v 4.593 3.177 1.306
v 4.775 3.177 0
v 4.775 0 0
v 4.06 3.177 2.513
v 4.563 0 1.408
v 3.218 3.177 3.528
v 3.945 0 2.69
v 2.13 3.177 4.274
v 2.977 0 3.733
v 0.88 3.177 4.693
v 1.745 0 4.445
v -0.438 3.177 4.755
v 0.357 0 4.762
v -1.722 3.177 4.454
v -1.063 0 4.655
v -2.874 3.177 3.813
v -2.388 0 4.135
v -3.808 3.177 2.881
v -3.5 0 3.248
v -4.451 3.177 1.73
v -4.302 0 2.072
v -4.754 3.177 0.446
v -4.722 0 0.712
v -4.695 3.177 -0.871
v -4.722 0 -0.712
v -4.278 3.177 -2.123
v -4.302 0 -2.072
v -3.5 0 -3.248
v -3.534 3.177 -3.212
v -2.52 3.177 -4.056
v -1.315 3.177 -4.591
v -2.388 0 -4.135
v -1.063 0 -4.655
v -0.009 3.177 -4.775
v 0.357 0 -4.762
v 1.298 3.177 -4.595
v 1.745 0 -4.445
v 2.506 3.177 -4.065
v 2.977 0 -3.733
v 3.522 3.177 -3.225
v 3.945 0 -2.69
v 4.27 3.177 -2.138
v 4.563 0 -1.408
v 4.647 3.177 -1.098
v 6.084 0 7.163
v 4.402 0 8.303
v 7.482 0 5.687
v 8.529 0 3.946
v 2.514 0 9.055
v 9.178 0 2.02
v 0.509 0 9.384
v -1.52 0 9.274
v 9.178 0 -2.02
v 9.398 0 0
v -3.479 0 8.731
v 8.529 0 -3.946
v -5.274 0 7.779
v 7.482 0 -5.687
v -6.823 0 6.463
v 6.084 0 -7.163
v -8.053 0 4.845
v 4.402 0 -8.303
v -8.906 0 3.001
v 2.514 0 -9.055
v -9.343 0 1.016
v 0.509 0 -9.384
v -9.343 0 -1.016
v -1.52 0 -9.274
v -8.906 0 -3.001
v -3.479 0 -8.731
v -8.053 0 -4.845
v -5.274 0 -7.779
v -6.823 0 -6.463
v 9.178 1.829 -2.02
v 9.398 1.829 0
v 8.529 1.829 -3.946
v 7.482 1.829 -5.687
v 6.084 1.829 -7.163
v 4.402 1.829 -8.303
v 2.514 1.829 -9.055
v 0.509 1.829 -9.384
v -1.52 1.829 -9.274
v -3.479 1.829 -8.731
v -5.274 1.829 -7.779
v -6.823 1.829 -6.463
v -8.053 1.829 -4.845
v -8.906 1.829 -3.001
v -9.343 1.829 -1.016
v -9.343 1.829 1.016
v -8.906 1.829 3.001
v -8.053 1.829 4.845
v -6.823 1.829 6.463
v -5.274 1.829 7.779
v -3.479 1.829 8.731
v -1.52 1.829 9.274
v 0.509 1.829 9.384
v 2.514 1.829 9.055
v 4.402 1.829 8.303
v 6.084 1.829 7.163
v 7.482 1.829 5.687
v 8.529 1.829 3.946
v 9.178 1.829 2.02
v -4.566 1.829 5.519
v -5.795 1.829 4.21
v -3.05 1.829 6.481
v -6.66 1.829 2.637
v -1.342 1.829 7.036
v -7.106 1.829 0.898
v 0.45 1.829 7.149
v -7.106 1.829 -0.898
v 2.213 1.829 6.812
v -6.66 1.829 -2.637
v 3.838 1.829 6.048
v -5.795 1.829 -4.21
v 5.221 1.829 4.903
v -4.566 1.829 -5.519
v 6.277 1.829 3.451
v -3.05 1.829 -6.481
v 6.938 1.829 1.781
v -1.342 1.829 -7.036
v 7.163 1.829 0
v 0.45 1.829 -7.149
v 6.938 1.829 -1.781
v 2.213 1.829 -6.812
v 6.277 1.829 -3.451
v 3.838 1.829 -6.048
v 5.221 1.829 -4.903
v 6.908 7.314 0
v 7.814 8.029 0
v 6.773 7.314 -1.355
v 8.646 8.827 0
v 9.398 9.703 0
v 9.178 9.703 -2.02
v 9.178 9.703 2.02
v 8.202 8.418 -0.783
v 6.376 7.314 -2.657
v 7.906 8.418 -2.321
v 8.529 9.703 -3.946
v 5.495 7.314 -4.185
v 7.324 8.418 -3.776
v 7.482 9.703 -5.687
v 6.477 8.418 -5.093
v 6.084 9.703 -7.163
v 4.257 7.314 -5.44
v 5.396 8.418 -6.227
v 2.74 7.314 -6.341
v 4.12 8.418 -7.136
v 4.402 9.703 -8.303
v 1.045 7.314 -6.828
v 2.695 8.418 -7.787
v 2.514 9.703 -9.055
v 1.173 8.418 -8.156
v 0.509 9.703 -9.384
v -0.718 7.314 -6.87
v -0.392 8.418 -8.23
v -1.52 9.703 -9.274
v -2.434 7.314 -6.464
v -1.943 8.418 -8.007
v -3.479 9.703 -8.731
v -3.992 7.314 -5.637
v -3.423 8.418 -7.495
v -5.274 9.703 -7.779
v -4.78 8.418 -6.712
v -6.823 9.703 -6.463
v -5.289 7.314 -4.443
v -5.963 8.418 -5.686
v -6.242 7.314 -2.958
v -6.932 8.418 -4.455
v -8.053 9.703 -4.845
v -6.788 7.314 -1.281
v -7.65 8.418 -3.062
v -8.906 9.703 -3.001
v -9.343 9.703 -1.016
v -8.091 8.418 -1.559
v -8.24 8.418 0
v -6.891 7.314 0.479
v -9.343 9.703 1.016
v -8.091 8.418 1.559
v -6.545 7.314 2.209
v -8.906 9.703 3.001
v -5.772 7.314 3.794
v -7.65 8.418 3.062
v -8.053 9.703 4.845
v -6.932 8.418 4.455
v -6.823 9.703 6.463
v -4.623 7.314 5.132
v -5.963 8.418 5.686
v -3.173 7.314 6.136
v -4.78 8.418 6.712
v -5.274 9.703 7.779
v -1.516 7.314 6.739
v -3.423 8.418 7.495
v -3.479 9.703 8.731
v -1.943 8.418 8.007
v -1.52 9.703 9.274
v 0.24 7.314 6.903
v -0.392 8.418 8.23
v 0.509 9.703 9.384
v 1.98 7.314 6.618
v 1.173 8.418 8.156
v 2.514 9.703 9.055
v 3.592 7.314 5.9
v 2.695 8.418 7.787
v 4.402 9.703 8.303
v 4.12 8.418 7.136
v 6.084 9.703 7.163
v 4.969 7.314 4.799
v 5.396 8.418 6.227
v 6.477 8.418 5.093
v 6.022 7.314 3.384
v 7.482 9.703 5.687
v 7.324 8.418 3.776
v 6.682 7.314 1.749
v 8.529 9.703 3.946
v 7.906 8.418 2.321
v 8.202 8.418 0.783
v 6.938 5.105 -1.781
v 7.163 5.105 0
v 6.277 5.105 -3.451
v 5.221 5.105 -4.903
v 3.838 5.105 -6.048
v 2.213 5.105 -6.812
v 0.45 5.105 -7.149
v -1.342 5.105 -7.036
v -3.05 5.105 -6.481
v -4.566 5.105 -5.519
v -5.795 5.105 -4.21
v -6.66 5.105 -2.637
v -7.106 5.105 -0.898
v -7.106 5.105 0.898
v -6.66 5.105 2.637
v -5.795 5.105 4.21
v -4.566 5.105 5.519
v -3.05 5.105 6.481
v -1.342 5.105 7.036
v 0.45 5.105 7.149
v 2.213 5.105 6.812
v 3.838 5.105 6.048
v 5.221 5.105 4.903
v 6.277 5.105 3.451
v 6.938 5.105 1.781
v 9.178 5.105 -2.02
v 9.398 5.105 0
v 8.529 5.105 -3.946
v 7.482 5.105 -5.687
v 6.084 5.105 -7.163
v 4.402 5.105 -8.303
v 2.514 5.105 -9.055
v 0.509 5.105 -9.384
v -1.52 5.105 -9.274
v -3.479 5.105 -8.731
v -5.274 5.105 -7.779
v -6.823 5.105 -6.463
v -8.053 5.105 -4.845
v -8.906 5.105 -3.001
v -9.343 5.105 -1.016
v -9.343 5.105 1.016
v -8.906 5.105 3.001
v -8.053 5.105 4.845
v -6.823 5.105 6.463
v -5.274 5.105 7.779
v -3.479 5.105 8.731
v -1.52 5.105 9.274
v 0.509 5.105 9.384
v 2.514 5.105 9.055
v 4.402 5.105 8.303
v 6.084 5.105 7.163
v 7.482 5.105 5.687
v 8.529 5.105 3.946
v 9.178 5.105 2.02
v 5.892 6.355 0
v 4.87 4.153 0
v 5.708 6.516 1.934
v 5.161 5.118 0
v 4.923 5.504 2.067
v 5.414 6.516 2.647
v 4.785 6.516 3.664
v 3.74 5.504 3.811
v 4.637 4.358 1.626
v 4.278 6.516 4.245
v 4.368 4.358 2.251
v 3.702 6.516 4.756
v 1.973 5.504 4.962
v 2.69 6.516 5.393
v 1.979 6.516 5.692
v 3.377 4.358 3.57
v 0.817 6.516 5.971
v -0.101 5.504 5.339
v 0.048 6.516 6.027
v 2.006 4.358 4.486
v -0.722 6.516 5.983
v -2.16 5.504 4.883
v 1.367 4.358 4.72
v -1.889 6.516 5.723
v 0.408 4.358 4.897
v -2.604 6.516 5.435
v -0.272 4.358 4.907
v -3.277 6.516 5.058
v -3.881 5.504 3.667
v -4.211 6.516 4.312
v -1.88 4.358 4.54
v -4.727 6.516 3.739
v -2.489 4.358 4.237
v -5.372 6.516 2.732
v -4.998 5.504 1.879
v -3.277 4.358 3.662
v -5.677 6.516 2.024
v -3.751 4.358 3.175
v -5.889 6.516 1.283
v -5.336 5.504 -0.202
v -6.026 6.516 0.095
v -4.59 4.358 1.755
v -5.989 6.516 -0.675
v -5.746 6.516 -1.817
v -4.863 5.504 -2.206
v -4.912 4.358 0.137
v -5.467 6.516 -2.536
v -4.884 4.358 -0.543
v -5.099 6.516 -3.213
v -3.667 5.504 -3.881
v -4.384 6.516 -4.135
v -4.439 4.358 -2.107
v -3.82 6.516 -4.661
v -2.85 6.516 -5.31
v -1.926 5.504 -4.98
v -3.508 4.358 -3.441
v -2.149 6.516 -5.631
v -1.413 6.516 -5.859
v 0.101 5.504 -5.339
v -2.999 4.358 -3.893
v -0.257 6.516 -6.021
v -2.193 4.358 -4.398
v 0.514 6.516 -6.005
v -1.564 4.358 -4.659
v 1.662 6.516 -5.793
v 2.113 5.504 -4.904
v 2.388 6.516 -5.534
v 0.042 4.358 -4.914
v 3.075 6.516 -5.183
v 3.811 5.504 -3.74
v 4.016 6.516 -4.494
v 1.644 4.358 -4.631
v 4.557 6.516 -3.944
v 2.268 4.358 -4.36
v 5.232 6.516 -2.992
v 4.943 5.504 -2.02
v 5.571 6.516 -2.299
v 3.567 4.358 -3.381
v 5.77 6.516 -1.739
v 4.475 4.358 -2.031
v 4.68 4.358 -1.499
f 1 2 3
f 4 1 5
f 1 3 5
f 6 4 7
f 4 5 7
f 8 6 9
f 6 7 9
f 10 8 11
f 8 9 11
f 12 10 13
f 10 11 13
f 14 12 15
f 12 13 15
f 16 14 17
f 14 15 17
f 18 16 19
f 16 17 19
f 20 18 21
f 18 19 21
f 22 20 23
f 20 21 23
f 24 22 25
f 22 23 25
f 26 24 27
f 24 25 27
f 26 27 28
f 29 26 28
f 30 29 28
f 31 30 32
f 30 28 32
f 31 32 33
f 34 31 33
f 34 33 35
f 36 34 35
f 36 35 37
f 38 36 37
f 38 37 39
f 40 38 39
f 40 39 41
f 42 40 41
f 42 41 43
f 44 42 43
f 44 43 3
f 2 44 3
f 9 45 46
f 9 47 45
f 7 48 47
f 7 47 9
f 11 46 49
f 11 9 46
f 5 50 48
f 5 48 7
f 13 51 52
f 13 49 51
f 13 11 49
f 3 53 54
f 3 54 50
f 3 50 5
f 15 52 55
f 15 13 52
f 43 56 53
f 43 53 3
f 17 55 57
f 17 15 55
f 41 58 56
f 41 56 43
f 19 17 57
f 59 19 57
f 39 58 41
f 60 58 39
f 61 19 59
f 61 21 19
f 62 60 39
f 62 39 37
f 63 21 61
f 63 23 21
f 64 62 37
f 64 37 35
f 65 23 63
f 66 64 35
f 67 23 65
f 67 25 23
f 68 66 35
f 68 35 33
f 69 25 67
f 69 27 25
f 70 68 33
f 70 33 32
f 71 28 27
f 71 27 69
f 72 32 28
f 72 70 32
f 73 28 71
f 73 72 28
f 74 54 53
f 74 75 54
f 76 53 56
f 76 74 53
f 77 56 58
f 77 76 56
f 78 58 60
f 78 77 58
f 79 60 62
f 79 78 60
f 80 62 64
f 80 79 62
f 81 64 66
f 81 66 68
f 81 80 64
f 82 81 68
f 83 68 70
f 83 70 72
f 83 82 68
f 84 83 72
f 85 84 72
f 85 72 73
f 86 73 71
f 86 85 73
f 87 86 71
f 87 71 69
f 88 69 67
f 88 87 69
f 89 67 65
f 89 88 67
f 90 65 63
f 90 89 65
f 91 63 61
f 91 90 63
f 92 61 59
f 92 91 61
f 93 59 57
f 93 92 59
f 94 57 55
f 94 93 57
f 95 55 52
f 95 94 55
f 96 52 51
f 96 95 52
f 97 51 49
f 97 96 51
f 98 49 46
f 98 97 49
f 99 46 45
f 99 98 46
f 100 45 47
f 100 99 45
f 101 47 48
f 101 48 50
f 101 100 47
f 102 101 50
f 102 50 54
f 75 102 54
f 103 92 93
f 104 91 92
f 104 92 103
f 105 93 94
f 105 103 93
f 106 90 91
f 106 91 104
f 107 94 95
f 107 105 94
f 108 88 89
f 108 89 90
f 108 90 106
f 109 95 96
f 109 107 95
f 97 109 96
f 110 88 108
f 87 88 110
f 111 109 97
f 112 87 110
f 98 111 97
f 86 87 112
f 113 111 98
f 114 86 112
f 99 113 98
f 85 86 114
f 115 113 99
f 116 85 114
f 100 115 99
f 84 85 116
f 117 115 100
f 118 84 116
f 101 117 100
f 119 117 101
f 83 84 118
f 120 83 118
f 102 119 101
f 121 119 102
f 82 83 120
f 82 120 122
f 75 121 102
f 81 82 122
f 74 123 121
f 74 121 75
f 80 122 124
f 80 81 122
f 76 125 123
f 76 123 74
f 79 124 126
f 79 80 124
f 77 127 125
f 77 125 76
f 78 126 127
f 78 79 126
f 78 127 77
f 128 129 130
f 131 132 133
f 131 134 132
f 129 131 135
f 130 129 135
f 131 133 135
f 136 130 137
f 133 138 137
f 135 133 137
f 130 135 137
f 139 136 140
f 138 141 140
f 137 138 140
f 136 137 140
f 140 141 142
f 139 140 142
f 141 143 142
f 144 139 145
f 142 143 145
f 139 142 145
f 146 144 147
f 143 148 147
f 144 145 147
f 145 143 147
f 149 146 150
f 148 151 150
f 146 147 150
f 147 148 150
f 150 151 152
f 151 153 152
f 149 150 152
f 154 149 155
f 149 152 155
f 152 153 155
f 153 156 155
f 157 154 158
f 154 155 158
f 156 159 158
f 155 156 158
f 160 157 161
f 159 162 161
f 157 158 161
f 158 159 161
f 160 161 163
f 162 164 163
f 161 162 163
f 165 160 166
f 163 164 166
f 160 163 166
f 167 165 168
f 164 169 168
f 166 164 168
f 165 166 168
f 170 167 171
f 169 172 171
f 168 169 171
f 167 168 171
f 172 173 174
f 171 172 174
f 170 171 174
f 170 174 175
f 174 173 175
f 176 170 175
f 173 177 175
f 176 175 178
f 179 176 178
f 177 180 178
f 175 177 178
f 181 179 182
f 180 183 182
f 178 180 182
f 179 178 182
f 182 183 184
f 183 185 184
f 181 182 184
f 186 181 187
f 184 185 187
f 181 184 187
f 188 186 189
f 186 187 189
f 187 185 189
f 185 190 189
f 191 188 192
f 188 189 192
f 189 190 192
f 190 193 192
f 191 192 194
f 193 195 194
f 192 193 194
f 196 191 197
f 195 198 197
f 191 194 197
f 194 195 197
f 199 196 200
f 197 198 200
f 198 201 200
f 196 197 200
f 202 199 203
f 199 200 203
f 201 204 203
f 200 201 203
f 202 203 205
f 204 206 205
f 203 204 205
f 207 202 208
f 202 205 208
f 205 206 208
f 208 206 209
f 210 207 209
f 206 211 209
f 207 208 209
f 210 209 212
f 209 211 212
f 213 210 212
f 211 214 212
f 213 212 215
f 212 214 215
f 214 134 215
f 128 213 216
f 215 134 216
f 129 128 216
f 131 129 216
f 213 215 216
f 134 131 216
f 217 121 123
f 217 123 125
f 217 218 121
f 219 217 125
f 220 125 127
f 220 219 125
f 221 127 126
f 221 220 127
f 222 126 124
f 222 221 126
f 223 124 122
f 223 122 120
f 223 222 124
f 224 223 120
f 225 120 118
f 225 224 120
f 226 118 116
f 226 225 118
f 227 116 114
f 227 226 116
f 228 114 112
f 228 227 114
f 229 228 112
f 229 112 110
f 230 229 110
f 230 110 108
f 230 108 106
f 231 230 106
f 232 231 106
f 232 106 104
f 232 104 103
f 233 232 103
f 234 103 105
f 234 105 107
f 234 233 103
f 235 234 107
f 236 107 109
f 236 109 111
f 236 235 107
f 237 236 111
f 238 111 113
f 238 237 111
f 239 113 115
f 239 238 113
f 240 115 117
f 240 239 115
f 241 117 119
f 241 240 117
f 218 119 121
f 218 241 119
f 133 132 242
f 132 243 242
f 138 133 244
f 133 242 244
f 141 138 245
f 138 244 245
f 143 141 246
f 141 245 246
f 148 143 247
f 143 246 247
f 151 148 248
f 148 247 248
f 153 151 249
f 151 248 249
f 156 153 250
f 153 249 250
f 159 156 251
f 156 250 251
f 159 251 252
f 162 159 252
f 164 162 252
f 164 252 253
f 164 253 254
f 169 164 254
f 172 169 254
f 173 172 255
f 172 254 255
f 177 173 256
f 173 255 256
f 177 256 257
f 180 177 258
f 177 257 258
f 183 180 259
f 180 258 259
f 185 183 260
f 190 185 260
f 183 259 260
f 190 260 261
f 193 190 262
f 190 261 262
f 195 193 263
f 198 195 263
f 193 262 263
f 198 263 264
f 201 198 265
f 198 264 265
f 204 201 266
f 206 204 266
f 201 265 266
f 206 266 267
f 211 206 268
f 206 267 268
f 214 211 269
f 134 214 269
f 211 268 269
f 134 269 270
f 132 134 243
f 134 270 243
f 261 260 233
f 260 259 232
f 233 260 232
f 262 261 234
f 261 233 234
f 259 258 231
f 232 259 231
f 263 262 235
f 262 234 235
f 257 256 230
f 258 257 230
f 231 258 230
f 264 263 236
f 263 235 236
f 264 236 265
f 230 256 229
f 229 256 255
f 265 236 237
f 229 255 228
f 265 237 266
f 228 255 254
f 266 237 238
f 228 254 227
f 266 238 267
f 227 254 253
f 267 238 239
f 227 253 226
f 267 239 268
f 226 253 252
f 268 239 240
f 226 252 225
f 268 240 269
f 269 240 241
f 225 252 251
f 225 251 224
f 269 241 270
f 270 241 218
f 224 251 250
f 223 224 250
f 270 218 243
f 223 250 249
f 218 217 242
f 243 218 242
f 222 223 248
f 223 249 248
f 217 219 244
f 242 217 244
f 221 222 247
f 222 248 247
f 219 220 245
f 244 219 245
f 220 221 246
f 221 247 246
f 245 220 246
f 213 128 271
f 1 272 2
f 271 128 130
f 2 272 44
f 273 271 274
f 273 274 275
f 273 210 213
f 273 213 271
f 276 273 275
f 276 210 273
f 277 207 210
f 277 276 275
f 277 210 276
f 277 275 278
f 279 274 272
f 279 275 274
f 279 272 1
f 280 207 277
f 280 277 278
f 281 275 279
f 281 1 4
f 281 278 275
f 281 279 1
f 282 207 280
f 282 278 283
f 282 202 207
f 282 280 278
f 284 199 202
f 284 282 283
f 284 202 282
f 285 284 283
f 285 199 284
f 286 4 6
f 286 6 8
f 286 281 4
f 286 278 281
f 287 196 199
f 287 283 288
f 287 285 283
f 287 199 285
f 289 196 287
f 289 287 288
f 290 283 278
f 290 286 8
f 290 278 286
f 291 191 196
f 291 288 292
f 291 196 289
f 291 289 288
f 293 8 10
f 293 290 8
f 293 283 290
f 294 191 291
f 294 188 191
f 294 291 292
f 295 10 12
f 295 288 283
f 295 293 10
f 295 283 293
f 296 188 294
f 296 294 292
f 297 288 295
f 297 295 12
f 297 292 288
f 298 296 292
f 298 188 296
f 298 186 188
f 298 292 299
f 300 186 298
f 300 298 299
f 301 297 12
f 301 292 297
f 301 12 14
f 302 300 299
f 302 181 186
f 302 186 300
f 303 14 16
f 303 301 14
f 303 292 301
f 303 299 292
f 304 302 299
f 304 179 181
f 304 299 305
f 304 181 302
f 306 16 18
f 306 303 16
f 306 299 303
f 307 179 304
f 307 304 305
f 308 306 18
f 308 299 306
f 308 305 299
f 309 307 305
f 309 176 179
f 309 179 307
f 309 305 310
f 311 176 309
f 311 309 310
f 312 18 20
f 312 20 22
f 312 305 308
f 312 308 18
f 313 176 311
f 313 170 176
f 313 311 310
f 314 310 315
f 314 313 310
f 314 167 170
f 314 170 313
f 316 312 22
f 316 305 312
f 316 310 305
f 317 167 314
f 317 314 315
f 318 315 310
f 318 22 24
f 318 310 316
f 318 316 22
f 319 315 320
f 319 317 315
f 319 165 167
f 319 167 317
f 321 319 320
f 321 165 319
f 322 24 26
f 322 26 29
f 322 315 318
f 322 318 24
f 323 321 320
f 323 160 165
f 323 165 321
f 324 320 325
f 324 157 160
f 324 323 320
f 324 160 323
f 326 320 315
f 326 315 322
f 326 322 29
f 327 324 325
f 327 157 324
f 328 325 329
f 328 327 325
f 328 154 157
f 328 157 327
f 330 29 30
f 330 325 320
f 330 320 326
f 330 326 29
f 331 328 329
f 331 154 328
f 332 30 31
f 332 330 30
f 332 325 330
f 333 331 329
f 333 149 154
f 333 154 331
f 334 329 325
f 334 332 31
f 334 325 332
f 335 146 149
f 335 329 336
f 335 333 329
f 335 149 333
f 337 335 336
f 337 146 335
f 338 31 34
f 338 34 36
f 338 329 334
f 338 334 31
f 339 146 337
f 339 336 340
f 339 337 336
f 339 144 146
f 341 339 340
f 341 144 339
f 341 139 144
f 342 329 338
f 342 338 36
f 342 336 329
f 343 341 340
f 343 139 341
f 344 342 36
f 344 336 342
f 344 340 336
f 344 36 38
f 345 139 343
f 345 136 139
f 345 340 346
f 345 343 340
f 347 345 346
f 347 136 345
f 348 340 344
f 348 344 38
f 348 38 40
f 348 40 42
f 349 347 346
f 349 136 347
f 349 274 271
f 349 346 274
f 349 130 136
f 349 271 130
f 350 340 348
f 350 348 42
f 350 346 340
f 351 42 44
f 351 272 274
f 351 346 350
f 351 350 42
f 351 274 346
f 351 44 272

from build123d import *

# Parameters (mm, degrees)
SKETCH4_R          = 4.7752
CUT_EXTRUDE1_DEPTH = 12.446
FILLET2_R          = 5.08


with BuildPart() as part:
    # Sketch3 → Revolve3 (revolve)
    with BuildSketch(Plane.XY):
        with BuildLine():
            Line((0, 5.1054), (0, 0))
            Line((0, 0), (9.398, 0))
            Line((9.398, 0), (9.398, 1.8288))
            Line((9.398, 1.8288), (7.1628, 1.8288))
            Line((7.1628, 1.8288), (7.1628, 5.1054))
            Line((7.1628, 5.1054), (9.398, 5.1054))
            Line((9.398, 5.1054), (9.398, 9.7028))
            ThreePointArc((9.398, 9.7028), (5.231120596, 6.316339666), (0, 5.1054))
        make_face()
    revolve(axis=Axis((0, 0, 0), (0, 1, 0)))

    # Sketch4 → Cut-Extrude1 (cut)
    with BuildSketch(Plane.XZ):
        Circle(SKETCH4_R)
    extrude(amount=-CUT_EXTRUDE1_DEPTH, mode=Mode.SUBTRACT)

    # Fillet2
    fillet2_edges = [part.edges().sort_by_distance(p)[0] for p in [
        (-4.7752, 6.105113597, 0),
    ]]
    fillet(fillet2_edges, radius=FILLET2_R)


solid = part.part
